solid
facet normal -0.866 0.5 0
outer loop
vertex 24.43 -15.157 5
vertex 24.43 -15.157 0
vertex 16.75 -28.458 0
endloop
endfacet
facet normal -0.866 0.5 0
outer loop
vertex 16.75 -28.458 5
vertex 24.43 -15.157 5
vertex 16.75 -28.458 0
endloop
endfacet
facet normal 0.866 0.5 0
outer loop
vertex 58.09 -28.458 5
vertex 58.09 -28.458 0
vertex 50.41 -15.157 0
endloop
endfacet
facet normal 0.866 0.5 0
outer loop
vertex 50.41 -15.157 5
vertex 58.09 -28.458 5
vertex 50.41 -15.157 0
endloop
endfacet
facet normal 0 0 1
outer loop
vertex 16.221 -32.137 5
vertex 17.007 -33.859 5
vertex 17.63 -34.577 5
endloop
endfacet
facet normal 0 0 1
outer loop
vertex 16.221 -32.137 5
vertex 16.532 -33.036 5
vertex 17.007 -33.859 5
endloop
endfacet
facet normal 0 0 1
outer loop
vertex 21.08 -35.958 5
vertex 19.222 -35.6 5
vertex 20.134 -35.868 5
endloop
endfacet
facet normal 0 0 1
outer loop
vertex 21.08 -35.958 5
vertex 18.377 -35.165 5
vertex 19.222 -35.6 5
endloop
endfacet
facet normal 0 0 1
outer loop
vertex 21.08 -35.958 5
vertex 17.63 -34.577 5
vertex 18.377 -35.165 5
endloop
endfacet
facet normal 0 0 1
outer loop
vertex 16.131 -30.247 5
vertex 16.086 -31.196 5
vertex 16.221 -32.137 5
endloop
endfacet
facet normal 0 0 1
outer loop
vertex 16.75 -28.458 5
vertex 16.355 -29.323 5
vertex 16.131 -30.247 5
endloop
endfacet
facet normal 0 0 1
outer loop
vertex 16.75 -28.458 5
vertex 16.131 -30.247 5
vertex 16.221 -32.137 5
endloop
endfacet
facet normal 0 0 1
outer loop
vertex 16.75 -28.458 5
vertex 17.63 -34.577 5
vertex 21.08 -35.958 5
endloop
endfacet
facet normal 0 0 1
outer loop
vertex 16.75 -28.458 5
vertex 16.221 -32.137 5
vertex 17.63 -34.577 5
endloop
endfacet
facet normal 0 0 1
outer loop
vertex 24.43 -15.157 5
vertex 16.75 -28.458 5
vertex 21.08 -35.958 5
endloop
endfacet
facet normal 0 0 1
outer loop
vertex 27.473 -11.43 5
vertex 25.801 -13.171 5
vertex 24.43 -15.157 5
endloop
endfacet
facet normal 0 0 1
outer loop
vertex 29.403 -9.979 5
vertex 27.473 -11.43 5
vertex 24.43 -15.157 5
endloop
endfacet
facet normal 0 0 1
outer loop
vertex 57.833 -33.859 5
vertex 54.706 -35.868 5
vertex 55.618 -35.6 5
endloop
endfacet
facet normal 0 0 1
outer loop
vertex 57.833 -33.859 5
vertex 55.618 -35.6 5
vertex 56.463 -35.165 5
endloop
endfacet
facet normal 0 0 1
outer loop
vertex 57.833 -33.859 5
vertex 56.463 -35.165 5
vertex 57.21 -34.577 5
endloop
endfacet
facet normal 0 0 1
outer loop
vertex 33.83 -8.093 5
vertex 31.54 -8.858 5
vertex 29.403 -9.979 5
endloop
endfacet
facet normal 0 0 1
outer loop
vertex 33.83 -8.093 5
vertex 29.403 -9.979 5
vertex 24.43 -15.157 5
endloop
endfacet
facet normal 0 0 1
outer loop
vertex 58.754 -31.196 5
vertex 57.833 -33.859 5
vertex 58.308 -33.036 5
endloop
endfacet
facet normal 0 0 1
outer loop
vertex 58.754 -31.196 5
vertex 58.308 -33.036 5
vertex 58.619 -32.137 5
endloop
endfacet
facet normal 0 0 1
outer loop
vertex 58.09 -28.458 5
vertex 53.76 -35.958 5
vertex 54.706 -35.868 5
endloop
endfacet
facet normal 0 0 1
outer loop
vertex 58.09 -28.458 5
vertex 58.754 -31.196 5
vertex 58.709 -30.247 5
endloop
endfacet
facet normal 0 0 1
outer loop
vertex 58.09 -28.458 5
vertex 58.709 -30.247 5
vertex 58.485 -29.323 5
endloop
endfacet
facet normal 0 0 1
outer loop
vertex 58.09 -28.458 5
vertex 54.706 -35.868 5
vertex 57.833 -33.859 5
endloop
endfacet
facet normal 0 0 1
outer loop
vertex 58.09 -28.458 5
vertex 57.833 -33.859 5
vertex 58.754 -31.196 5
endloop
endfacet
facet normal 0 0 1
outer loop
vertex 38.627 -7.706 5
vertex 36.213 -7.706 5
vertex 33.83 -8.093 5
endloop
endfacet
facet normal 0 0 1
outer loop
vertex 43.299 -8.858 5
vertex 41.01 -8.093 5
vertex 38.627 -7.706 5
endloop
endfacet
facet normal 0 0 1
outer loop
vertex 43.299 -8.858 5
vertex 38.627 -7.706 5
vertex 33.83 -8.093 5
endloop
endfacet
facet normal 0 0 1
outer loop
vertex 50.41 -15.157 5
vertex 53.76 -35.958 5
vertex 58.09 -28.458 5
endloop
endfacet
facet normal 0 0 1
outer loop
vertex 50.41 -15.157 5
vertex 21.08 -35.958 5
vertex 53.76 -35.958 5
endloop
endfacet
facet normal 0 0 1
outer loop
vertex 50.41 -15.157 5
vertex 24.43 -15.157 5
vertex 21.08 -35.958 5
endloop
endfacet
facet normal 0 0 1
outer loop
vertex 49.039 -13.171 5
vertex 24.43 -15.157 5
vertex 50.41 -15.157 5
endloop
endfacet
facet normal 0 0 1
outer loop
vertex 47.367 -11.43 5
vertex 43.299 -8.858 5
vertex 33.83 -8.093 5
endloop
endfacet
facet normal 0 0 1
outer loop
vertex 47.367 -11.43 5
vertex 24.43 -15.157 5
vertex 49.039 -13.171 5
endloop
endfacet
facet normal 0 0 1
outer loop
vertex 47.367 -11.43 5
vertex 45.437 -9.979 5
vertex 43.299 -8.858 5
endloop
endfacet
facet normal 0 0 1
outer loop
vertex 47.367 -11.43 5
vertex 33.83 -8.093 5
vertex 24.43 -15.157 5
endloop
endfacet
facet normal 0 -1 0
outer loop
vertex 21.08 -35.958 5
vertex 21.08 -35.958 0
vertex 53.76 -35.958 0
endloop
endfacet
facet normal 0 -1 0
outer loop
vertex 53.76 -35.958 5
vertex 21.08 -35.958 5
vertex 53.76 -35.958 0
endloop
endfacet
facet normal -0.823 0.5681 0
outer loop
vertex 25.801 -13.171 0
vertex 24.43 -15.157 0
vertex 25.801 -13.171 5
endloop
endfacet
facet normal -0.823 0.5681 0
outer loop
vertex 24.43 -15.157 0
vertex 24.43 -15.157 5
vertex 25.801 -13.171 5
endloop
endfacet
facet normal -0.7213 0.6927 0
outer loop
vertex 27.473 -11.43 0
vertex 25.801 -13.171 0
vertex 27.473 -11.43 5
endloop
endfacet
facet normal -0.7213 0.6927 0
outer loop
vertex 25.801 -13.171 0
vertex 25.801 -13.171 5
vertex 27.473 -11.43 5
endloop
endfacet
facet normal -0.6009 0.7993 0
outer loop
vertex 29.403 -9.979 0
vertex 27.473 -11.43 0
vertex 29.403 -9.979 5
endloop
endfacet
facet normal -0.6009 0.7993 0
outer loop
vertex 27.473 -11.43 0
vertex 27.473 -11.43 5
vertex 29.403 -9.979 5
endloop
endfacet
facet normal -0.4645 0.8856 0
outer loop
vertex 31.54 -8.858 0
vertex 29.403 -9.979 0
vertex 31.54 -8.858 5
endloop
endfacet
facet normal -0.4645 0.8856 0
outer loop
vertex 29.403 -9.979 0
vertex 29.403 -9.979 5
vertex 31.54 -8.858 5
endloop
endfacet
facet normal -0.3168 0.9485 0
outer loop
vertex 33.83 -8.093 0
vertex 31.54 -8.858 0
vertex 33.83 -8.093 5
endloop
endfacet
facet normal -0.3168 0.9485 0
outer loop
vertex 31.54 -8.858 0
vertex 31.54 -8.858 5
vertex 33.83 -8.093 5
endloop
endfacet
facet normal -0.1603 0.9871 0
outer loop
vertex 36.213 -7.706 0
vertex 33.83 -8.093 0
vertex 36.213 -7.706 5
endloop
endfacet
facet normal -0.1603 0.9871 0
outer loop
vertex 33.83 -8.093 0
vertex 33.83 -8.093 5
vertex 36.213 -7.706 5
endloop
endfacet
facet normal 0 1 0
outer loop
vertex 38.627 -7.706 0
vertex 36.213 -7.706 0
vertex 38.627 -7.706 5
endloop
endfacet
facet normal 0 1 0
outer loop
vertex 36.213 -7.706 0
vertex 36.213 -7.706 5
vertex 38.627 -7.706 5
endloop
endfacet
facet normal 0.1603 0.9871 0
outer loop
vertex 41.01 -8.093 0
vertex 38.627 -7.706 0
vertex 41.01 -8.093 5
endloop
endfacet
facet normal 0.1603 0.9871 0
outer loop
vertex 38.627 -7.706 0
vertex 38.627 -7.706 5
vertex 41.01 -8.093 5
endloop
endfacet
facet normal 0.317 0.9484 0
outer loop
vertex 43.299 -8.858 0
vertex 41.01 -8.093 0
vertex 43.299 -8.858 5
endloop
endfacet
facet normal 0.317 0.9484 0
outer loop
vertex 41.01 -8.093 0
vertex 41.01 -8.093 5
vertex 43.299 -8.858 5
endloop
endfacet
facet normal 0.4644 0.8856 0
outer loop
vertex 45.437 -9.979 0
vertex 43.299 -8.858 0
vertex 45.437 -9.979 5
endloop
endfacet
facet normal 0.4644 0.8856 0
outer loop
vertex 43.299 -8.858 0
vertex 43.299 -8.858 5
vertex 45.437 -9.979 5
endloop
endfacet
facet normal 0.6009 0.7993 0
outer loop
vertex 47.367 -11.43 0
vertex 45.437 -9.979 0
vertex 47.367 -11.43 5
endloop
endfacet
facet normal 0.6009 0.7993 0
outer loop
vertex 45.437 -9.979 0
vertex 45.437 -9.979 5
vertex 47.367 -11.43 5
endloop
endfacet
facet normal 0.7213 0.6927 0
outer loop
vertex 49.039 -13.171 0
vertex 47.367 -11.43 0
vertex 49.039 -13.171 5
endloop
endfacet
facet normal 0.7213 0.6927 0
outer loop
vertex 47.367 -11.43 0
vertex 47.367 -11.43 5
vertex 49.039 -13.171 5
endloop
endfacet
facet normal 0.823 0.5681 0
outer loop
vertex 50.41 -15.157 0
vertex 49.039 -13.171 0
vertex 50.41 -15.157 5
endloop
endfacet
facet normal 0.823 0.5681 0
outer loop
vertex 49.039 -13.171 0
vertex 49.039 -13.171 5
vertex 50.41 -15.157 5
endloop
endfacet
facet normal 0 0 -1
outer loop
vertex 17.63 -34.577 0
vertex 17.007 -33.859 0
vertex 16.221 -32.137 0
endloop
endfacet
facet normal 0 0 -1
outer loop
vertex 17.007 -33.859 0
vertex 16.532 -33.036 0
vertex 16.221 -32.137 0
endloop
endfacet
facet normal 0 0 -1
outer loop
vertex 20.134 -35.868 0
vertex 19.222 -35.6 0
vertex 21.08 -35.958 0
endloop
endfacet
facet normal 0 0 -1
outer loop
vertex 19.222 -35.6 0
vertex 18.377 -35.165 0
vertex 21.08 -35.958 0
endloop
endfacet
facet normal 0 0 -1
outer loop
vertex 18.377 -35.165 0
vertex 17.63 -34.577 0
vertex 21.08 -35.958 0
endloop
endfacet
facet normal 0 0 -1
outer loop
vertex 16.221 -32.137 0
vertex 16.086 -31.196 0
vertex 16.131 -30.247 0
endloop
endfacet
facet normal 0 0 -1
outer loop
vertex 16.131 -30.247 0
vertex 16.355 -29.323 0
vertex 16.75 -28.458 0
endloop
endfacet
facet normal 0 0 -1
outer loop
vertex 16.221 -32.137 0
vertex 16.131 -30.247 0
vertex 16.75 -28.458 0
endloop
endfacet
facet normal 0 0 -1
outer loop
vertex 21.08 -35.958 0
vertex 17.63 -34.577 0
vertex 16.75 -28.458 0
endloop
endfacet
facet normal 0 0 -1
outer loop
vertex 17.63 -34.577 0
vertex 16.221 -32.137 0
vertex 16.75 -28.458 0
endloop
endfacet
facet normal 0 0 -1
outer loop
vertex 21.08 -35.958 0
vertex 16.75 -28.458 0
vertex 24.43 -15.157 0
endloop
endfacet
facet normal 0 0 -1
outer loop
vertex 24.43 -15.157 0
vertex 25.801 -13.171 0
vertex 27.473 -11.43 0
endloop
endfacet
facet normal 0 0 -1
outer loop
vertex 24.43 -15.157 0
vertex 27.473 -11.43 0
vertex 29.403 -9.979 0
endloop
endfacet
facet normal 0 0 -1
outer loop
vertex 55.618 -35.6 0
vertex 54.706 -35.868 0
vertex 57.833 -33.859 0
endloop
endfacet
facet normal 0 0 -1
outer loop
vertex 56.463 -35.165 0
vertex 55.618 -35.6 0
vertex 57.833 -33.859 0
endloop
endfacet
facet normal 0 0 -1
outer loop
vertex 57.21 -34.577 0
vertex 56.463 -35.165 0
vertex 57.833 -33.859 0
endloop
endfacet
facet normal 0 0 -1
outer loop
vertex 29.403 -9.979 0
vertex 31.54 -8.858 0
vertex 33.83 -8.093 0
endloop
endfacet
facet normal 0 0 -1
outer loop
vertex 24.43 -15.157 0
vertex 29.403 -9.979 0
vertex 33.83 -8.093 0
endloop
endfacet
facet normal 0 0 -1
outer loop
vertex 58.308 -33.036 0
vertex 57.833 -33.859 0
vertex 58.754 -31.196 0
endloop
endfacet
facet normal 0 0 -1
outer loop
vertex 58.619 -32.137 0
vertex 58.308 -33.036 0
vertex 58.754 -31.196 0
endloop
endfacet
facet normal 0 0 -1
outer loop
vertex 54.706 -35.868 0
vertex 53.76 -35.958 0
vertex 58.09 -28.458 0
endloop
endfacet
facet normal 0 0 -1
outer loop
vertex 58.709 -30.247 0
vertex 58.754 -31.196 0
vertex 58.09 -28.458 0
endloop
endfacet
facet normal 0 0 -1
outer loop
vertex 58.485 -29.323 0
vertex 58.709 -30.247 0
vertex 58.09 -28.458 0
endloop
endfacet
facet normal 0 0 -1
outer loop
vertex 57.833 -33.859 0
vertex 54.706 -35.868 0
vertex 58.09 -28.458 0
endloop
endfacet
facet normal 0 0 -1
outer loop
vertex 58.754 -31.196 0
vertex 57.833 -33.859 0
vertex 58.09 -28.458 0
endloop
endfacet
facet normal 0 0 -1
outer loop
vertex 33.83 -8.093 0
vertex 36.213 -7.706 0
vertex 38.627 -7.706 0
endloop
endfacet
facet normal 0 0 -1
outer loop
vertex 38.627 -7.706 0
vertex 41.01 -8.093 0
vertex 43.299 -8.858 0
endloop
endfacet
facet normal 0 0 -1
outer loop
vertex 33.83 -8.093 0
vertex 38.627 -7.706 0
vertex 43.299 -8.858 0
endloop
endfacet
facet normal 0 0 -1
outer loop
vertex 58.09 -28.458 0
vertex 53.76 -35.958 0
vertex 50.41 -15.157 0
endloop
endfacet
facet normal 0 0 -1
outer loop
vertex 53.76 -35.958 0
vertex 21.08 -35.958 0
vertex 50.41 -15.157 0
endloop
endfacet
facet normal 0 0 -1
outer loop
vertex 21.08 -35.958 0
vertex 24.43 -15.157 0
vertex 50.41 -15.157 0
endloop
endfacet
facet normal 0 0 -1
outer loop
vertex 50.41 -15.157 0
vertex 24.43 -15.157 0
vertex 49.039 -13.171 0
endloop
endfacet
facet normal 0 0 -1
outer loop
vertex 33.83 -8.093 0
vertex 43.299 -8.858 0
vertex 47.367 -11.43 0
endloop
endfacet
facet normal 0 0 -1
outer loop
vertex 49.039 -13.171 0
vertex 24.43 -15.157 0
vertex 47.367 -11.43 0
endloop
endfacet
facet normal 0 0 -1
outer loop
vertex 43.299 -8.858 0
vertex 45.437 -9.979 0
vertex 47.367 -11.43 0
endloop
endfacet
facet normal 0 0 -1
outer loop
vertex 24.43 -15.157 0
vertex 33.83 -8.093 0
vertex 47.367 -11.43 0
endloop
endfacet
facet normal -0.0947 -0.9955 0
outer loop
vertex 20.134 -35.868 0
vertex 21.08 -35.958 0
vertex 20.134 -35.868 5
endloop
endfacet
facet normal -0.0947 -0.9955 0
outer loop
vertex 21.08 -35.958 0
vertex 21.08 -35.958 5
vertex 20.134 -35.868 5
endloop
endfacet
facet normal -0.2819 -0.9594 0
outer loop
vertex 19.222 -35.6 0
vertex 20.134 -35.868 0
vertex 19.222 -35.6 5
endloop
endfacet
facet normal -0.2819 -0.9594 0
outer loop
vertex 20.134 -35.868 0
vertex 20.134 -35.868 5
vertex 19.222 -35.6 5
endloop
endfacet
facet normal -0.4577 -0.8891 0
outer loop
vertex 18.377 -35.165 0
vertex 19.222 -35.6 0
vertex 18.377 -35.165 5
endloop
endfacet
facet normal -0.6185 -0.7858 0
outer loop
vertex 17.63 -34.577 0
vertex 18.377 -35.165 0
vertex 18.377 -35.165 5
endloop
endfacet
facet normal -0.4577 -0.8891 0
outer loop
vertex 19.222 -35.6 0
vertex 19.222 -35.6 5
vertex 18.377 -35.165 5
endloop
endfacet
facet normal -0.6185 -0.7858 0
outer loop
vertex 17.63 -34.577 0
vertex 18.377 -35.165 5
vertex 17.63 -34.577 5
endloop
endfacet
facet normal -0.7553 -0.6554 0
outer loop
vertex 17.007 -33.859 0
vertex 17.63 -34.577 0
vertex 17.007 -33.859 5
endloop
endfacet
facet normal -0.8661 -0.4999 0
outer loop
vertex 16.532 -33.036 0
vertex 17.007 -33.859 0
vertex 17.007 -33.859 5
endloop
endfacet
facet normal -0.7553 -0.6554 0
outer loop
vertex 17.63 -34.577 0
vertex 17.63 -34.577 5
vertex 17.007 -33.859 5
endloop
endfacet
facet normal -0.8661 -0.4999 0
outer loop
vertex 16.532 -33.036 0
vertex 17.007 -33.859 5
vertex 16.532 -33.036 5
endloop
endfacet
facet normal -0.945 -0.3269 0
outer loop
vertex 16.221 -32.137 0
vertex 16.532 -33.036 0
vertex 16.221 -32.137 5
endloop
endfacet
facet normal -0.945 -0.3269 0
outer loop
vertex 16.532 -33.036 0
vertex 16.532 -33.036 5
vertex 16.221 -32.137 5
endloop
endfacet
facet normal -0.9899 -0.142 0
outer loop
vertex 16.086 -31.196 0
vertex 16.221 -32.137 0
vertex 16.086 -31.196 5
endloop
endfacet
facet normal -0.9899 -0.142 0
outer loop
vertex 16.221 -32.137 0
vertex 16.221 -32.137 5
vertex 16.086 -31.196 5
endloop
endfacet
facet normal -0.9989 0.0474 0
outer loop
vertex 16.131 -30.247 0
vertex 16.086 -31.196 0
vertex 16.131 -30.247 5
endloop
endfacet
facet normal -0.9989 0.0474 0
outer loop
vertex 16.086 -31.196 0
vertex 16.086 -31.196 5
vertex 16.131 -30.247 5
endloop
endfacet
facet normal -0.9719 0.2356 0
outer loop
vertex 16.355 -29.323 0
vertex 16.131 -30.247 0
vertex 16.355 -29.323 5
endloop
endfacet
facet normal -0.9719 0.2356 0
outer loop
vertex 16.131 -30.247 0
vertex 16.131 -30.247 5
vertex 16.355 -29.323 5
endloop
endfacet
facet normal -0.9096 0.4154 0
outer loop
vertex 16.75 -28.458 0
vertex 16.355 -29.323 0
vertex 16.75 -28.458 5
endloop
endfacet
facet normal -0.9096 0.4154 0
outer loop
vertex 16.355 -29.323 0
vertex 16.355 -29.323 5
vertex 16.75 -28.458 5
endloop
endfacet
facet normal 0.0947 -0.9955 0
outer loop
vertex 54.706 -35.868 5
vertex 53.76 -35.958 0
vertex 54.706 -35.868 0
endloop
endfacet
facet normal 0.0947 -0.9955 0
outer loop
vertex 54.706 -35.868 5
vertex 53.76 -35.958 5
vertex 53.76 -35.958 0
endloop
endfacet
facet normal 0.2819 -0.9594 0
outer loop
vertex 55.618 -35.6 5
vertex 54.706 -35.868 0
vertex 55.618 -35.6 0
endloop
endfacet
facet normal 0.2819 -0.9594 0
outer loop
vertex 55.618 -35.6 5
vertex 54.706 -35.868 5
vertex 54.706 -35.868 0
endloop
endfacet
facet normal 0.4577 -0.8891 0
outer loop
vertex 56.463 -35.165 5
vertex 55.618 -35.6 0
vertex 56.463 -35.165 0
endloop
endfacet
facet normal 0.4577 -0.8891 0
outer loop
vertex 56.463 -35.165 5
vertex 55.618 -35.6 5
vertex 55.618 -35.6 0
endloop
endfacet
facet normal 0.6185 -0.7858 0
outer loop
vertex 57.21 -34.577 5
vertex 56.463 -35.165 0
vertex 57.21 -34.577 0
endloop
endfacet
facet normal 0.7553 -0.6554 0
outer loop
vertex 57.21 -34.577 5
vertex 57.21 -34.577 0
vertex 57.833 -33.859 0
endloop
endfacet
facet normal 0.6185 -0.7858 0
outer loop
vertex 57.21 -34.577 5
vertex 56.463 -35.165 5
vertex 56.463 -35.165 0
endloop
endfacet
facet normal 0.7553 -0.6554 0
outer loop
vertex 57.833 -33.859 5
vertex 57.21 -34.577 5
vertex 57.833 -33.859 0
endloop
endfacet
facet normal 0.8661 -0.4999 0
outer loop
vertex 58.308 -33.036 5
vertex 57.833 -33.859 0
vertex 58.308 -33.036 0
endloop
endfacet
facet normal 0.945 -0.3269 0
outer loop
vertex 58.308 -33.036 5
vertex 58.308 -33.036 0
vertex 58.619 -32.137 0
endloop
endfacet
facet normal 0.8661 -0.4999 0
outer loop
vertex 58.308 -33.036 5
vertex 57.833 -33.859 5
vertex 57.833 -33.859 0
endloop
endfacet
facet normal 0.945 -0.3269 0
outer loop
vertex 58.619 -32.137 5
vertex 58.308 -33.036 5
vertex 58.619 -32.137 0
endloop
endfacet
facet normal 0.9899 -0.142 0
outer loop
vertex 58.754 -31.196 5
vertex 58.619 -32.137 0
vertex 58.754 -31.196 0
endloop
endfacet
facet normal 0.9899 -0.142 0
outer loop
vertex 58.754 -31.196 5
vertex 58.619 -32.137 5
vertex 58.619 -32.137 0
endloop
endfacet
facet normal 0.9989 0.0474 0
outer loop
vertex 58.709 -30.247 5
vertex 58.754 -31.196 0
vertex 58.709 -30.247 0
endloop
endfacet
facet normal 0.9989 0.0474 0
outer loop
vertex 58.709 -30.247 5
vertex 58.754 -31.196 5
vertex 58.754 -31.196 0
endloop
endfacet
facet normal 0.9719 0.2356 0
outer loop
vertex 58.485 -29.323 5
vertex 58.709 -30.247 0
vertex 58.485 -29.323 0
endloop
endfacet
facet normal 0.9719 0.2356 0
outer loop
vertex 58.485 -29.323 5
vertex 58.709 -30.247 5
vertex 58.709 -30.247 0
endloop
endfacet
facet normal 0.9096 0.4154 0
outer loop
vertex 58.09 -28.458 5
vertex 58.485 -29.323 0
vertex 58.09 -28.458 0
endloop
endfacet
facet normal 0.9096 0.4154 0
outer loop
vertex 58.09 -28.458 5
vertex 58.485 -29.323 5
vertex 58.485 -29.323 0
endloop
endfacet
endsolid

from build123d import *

# Parameters (mm, degrees)
F1_DEPTH = 5
F2_R     = 5
F3_R     = 15


with BuildPart() as f1:
    # F0 (on Top) → F1 (new body)
    with BuildSketch(Plane.XY):
        Polygon((12.419975, -35.958487), (62.419975, -35.958487), (37.419975, 7.342783), align=None)
    extrude(amount=F1_DEPTH)

    # F2
    f2_edges = [f1.edges().sort_by_distance(p)[0] for p in [
        (62.419975, -35.958487, 2.5),
        (12.419975, -35.958487, 2.5),
    ]]
    fillet(f2_edges, radius=F2_R)

    # F3
    f3_edges = [f1.edges().sort_by_distance(p)[0] for p in [
        (37.419975, 7.342783, 2.5),
    ]]
    fillet(f3_edges, radius=F3_R)


solid = f1.part
